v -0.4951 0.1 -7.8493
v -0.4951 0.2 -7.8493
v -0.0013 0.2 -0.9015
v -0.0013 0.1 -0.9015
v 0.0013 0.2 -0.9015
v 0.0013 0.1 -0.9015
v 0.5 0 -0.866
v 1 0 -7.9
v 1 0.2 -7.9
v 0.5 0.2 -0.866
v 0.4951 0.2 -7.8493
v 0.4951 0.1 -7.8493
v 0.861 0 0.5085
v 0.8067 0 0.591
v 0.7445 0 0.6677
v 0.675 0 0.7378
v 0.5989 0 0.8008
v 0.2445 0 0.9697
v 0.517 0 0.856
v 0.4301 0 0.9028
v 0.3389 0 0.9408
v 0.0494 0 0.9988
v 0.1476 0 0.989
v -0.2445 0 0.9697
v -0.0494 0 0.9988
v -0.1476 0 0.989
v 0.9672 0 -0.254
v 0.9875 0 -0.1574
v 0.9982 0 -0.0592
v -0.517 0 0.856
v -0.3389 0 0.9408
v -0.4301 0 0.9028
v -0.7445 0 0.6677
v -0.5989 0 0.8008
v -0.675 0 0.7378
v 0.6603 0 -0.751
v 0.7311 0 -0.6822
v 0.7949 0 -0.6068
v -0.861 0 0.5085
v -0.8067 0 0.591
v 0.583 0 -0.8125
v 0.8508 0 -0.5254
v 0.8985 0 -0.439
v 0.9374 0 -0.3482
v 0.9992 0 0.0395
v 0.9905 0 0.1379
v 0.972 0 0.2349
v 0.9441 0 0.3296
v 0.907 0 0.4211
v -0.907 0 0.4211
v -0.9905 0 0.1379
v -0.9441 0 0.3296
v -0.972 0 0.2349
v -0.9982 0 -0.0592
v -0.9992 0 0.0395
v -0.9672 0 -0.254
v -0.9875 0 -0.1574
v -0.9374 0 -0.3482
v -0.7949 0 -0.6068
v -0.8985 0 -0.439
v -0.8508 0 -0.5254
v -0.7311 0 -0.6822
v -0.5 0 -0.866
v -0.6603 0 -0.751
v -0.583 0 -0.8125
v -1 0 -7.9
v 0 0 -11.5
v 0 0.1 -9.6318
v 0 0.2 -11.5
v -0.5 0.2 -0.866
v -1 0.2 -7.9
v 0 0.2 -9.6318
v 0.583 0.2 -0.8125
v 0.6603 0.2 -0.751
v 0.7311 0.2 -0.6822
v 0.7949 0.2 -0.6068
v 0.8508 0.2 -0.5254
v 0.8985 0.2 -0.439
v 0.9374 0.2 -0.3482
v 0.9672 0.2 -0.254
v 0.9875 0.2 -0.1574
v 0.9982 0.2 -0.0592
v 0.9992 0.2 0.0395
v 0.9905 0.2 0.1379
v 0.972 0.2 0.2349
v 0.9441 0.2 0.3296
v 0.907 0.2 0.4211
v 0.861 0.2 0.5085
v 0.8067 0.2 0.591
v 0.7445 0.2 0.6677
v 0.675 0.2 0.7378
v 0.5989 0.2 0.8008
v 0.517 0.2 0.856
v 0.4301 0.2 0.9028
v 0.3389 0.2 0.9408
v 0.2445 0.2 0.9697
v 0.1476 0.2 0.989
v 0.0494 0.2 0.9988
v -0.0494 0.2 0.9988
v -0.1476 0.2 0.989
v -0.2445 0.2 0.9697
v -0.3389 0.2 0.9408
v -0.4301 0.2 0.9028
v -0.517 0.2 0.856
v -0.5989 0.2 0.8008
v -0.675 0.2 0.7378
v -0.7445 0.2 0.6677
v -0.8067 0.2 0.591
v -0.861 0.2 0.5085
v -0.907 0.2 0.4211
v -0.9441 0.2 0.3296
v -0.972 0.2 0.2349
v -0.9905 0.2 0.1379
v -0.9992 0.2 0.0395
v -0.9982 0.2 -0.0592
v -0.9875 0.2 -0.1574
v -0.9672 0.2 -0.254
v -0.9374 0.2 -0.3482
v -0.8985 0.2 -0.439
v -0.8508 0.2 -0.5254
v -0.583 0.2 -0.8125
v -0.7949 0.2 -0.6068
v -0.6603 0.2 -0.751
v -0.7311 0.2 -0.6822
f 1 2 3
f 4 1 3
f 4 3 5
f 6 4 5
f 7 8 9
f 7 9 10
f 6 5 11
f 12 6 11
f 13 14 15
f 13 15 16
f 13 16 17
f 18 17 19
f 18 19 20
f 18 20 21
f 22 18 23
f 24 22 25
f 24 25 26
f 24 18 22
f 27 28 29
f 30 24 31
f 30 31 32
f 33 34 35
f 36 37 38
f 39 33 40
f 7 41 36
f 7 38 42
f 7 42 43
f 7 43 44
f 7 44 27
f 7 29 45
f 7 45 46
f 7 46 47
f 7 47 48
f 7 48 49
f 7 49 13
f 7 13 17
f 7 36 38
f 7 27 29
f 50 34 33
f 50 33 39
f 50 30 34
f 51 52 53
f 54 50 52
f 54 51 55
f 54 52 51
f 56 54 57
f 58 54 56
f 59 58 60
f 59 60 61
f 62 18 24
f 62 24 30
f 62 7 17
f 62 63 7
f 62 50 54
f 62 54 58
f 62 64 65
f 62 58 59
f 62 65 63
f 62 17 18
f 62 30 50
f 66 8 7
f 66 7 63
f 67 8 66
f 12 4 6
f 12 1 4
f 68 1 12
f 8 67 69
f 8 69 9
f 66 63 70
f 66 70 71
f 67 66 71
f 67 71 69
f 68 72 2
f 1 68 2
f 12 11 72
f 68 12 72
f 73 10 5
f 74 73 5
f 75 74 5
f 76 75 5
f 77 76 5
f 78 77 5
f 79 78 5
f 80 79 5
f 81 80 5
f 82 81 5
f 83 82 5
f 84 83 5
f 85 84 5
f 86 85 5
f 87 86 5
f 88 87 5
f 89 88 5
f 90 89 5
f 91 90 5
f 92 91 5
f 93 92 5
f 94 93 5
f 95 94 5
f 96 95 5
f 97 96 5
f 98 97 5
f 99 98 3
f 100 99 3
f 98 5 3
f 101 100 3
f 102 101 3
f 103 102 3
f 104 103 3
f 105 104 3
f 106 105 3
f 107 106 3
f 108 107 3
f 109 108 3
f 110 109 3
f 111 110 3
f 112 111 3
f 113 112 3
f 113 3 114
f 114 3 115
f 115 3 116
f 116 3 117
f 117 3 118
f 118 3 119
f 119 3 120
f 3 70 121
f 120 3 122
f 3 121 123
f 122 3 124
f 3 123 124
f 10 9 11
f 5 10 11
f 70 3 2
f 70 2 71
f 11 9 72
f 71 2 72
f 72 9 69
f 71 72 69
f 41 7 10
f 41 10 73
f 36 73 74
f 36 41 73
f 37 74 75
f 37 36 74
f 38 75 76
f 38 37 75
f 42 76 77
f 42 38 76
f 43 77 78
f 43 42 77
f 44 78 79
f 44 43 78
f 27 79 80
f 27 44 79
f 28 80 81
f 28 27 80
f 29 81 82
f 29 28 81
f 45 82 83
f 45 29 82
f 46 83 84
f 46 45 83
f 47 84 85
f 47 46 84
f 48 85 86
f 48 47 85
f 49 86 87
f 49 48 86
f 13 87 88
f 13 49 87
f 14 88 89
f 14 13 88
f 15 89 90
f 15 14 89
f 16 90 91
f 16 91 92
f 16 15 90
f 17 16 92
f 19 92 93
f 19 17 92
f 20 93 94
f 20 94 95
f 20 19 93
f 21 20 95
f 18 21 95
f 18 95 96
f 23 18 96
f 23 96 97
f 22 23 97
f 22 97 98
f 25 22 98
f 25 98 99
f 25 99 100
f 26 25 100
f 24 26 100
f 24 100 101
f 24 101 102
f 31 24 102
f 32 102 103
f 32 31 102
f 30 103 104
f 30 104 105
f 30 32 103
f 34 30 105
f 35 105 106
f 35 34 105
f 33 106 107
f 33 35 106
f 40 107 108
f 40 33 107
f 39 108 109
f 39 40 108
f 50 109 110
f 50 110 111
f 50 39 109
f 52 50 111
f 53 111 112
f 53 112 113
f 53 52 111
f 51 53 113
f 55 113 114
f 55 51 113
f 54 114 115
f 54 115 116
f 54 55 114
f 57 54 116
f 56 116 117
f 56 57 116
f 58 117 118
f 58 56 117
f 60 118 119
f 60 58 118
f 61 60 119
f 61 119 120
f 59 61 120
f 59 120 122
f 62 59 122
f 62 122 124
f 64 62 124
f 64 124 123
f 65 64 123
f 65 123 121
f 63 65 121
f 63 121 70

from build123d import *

# Parameters (mm, degrees)
EXTRUDE1_DEPTH = 0.2
EXTRUDE2_DEPTH = 0.1


with BuildPart() as part:
    # Sketch1 → Extrude1 (new body)
    with BuildSketch(Plane(origin=(0, 0, 0), x_dir=(1, 0, 0), z_dir=(0, 1, 0))):
        with BuildLine():
            Line((0, 11.5), (1, 7.9))
            Line((1, 7.9), (0.5, 0.866025404))
            ThreePointArc((0.5, 0.866025404), (0, -1), (-0.5, 0.866025404))
            Line((-0.5, 0.866025404), (-1, 7.9))
            Line((-1, 7.9), (0, 11.5))
        make_face()
    extrude(amount=EXTRUDE1_DEPTH)

    # Sketch2 → Extrude2 (cut)
    with BuildSketch(Plane(origin=(0, 0.2, 0), x_dir=(1, 0, 0), z_dir=(0, 1, 0))):
        Polygon((-0.001258451, 0.901477732), (0.001258451, 0.901477732), (0.495137938, 7.849349255), (0, 9.631845831), (-0.495137938, 7.849349255), align=None)
    extrude(amount=-EXTRUDE2_DEPTH, mode=Mode.SUBTRACT)


solid = part.part
